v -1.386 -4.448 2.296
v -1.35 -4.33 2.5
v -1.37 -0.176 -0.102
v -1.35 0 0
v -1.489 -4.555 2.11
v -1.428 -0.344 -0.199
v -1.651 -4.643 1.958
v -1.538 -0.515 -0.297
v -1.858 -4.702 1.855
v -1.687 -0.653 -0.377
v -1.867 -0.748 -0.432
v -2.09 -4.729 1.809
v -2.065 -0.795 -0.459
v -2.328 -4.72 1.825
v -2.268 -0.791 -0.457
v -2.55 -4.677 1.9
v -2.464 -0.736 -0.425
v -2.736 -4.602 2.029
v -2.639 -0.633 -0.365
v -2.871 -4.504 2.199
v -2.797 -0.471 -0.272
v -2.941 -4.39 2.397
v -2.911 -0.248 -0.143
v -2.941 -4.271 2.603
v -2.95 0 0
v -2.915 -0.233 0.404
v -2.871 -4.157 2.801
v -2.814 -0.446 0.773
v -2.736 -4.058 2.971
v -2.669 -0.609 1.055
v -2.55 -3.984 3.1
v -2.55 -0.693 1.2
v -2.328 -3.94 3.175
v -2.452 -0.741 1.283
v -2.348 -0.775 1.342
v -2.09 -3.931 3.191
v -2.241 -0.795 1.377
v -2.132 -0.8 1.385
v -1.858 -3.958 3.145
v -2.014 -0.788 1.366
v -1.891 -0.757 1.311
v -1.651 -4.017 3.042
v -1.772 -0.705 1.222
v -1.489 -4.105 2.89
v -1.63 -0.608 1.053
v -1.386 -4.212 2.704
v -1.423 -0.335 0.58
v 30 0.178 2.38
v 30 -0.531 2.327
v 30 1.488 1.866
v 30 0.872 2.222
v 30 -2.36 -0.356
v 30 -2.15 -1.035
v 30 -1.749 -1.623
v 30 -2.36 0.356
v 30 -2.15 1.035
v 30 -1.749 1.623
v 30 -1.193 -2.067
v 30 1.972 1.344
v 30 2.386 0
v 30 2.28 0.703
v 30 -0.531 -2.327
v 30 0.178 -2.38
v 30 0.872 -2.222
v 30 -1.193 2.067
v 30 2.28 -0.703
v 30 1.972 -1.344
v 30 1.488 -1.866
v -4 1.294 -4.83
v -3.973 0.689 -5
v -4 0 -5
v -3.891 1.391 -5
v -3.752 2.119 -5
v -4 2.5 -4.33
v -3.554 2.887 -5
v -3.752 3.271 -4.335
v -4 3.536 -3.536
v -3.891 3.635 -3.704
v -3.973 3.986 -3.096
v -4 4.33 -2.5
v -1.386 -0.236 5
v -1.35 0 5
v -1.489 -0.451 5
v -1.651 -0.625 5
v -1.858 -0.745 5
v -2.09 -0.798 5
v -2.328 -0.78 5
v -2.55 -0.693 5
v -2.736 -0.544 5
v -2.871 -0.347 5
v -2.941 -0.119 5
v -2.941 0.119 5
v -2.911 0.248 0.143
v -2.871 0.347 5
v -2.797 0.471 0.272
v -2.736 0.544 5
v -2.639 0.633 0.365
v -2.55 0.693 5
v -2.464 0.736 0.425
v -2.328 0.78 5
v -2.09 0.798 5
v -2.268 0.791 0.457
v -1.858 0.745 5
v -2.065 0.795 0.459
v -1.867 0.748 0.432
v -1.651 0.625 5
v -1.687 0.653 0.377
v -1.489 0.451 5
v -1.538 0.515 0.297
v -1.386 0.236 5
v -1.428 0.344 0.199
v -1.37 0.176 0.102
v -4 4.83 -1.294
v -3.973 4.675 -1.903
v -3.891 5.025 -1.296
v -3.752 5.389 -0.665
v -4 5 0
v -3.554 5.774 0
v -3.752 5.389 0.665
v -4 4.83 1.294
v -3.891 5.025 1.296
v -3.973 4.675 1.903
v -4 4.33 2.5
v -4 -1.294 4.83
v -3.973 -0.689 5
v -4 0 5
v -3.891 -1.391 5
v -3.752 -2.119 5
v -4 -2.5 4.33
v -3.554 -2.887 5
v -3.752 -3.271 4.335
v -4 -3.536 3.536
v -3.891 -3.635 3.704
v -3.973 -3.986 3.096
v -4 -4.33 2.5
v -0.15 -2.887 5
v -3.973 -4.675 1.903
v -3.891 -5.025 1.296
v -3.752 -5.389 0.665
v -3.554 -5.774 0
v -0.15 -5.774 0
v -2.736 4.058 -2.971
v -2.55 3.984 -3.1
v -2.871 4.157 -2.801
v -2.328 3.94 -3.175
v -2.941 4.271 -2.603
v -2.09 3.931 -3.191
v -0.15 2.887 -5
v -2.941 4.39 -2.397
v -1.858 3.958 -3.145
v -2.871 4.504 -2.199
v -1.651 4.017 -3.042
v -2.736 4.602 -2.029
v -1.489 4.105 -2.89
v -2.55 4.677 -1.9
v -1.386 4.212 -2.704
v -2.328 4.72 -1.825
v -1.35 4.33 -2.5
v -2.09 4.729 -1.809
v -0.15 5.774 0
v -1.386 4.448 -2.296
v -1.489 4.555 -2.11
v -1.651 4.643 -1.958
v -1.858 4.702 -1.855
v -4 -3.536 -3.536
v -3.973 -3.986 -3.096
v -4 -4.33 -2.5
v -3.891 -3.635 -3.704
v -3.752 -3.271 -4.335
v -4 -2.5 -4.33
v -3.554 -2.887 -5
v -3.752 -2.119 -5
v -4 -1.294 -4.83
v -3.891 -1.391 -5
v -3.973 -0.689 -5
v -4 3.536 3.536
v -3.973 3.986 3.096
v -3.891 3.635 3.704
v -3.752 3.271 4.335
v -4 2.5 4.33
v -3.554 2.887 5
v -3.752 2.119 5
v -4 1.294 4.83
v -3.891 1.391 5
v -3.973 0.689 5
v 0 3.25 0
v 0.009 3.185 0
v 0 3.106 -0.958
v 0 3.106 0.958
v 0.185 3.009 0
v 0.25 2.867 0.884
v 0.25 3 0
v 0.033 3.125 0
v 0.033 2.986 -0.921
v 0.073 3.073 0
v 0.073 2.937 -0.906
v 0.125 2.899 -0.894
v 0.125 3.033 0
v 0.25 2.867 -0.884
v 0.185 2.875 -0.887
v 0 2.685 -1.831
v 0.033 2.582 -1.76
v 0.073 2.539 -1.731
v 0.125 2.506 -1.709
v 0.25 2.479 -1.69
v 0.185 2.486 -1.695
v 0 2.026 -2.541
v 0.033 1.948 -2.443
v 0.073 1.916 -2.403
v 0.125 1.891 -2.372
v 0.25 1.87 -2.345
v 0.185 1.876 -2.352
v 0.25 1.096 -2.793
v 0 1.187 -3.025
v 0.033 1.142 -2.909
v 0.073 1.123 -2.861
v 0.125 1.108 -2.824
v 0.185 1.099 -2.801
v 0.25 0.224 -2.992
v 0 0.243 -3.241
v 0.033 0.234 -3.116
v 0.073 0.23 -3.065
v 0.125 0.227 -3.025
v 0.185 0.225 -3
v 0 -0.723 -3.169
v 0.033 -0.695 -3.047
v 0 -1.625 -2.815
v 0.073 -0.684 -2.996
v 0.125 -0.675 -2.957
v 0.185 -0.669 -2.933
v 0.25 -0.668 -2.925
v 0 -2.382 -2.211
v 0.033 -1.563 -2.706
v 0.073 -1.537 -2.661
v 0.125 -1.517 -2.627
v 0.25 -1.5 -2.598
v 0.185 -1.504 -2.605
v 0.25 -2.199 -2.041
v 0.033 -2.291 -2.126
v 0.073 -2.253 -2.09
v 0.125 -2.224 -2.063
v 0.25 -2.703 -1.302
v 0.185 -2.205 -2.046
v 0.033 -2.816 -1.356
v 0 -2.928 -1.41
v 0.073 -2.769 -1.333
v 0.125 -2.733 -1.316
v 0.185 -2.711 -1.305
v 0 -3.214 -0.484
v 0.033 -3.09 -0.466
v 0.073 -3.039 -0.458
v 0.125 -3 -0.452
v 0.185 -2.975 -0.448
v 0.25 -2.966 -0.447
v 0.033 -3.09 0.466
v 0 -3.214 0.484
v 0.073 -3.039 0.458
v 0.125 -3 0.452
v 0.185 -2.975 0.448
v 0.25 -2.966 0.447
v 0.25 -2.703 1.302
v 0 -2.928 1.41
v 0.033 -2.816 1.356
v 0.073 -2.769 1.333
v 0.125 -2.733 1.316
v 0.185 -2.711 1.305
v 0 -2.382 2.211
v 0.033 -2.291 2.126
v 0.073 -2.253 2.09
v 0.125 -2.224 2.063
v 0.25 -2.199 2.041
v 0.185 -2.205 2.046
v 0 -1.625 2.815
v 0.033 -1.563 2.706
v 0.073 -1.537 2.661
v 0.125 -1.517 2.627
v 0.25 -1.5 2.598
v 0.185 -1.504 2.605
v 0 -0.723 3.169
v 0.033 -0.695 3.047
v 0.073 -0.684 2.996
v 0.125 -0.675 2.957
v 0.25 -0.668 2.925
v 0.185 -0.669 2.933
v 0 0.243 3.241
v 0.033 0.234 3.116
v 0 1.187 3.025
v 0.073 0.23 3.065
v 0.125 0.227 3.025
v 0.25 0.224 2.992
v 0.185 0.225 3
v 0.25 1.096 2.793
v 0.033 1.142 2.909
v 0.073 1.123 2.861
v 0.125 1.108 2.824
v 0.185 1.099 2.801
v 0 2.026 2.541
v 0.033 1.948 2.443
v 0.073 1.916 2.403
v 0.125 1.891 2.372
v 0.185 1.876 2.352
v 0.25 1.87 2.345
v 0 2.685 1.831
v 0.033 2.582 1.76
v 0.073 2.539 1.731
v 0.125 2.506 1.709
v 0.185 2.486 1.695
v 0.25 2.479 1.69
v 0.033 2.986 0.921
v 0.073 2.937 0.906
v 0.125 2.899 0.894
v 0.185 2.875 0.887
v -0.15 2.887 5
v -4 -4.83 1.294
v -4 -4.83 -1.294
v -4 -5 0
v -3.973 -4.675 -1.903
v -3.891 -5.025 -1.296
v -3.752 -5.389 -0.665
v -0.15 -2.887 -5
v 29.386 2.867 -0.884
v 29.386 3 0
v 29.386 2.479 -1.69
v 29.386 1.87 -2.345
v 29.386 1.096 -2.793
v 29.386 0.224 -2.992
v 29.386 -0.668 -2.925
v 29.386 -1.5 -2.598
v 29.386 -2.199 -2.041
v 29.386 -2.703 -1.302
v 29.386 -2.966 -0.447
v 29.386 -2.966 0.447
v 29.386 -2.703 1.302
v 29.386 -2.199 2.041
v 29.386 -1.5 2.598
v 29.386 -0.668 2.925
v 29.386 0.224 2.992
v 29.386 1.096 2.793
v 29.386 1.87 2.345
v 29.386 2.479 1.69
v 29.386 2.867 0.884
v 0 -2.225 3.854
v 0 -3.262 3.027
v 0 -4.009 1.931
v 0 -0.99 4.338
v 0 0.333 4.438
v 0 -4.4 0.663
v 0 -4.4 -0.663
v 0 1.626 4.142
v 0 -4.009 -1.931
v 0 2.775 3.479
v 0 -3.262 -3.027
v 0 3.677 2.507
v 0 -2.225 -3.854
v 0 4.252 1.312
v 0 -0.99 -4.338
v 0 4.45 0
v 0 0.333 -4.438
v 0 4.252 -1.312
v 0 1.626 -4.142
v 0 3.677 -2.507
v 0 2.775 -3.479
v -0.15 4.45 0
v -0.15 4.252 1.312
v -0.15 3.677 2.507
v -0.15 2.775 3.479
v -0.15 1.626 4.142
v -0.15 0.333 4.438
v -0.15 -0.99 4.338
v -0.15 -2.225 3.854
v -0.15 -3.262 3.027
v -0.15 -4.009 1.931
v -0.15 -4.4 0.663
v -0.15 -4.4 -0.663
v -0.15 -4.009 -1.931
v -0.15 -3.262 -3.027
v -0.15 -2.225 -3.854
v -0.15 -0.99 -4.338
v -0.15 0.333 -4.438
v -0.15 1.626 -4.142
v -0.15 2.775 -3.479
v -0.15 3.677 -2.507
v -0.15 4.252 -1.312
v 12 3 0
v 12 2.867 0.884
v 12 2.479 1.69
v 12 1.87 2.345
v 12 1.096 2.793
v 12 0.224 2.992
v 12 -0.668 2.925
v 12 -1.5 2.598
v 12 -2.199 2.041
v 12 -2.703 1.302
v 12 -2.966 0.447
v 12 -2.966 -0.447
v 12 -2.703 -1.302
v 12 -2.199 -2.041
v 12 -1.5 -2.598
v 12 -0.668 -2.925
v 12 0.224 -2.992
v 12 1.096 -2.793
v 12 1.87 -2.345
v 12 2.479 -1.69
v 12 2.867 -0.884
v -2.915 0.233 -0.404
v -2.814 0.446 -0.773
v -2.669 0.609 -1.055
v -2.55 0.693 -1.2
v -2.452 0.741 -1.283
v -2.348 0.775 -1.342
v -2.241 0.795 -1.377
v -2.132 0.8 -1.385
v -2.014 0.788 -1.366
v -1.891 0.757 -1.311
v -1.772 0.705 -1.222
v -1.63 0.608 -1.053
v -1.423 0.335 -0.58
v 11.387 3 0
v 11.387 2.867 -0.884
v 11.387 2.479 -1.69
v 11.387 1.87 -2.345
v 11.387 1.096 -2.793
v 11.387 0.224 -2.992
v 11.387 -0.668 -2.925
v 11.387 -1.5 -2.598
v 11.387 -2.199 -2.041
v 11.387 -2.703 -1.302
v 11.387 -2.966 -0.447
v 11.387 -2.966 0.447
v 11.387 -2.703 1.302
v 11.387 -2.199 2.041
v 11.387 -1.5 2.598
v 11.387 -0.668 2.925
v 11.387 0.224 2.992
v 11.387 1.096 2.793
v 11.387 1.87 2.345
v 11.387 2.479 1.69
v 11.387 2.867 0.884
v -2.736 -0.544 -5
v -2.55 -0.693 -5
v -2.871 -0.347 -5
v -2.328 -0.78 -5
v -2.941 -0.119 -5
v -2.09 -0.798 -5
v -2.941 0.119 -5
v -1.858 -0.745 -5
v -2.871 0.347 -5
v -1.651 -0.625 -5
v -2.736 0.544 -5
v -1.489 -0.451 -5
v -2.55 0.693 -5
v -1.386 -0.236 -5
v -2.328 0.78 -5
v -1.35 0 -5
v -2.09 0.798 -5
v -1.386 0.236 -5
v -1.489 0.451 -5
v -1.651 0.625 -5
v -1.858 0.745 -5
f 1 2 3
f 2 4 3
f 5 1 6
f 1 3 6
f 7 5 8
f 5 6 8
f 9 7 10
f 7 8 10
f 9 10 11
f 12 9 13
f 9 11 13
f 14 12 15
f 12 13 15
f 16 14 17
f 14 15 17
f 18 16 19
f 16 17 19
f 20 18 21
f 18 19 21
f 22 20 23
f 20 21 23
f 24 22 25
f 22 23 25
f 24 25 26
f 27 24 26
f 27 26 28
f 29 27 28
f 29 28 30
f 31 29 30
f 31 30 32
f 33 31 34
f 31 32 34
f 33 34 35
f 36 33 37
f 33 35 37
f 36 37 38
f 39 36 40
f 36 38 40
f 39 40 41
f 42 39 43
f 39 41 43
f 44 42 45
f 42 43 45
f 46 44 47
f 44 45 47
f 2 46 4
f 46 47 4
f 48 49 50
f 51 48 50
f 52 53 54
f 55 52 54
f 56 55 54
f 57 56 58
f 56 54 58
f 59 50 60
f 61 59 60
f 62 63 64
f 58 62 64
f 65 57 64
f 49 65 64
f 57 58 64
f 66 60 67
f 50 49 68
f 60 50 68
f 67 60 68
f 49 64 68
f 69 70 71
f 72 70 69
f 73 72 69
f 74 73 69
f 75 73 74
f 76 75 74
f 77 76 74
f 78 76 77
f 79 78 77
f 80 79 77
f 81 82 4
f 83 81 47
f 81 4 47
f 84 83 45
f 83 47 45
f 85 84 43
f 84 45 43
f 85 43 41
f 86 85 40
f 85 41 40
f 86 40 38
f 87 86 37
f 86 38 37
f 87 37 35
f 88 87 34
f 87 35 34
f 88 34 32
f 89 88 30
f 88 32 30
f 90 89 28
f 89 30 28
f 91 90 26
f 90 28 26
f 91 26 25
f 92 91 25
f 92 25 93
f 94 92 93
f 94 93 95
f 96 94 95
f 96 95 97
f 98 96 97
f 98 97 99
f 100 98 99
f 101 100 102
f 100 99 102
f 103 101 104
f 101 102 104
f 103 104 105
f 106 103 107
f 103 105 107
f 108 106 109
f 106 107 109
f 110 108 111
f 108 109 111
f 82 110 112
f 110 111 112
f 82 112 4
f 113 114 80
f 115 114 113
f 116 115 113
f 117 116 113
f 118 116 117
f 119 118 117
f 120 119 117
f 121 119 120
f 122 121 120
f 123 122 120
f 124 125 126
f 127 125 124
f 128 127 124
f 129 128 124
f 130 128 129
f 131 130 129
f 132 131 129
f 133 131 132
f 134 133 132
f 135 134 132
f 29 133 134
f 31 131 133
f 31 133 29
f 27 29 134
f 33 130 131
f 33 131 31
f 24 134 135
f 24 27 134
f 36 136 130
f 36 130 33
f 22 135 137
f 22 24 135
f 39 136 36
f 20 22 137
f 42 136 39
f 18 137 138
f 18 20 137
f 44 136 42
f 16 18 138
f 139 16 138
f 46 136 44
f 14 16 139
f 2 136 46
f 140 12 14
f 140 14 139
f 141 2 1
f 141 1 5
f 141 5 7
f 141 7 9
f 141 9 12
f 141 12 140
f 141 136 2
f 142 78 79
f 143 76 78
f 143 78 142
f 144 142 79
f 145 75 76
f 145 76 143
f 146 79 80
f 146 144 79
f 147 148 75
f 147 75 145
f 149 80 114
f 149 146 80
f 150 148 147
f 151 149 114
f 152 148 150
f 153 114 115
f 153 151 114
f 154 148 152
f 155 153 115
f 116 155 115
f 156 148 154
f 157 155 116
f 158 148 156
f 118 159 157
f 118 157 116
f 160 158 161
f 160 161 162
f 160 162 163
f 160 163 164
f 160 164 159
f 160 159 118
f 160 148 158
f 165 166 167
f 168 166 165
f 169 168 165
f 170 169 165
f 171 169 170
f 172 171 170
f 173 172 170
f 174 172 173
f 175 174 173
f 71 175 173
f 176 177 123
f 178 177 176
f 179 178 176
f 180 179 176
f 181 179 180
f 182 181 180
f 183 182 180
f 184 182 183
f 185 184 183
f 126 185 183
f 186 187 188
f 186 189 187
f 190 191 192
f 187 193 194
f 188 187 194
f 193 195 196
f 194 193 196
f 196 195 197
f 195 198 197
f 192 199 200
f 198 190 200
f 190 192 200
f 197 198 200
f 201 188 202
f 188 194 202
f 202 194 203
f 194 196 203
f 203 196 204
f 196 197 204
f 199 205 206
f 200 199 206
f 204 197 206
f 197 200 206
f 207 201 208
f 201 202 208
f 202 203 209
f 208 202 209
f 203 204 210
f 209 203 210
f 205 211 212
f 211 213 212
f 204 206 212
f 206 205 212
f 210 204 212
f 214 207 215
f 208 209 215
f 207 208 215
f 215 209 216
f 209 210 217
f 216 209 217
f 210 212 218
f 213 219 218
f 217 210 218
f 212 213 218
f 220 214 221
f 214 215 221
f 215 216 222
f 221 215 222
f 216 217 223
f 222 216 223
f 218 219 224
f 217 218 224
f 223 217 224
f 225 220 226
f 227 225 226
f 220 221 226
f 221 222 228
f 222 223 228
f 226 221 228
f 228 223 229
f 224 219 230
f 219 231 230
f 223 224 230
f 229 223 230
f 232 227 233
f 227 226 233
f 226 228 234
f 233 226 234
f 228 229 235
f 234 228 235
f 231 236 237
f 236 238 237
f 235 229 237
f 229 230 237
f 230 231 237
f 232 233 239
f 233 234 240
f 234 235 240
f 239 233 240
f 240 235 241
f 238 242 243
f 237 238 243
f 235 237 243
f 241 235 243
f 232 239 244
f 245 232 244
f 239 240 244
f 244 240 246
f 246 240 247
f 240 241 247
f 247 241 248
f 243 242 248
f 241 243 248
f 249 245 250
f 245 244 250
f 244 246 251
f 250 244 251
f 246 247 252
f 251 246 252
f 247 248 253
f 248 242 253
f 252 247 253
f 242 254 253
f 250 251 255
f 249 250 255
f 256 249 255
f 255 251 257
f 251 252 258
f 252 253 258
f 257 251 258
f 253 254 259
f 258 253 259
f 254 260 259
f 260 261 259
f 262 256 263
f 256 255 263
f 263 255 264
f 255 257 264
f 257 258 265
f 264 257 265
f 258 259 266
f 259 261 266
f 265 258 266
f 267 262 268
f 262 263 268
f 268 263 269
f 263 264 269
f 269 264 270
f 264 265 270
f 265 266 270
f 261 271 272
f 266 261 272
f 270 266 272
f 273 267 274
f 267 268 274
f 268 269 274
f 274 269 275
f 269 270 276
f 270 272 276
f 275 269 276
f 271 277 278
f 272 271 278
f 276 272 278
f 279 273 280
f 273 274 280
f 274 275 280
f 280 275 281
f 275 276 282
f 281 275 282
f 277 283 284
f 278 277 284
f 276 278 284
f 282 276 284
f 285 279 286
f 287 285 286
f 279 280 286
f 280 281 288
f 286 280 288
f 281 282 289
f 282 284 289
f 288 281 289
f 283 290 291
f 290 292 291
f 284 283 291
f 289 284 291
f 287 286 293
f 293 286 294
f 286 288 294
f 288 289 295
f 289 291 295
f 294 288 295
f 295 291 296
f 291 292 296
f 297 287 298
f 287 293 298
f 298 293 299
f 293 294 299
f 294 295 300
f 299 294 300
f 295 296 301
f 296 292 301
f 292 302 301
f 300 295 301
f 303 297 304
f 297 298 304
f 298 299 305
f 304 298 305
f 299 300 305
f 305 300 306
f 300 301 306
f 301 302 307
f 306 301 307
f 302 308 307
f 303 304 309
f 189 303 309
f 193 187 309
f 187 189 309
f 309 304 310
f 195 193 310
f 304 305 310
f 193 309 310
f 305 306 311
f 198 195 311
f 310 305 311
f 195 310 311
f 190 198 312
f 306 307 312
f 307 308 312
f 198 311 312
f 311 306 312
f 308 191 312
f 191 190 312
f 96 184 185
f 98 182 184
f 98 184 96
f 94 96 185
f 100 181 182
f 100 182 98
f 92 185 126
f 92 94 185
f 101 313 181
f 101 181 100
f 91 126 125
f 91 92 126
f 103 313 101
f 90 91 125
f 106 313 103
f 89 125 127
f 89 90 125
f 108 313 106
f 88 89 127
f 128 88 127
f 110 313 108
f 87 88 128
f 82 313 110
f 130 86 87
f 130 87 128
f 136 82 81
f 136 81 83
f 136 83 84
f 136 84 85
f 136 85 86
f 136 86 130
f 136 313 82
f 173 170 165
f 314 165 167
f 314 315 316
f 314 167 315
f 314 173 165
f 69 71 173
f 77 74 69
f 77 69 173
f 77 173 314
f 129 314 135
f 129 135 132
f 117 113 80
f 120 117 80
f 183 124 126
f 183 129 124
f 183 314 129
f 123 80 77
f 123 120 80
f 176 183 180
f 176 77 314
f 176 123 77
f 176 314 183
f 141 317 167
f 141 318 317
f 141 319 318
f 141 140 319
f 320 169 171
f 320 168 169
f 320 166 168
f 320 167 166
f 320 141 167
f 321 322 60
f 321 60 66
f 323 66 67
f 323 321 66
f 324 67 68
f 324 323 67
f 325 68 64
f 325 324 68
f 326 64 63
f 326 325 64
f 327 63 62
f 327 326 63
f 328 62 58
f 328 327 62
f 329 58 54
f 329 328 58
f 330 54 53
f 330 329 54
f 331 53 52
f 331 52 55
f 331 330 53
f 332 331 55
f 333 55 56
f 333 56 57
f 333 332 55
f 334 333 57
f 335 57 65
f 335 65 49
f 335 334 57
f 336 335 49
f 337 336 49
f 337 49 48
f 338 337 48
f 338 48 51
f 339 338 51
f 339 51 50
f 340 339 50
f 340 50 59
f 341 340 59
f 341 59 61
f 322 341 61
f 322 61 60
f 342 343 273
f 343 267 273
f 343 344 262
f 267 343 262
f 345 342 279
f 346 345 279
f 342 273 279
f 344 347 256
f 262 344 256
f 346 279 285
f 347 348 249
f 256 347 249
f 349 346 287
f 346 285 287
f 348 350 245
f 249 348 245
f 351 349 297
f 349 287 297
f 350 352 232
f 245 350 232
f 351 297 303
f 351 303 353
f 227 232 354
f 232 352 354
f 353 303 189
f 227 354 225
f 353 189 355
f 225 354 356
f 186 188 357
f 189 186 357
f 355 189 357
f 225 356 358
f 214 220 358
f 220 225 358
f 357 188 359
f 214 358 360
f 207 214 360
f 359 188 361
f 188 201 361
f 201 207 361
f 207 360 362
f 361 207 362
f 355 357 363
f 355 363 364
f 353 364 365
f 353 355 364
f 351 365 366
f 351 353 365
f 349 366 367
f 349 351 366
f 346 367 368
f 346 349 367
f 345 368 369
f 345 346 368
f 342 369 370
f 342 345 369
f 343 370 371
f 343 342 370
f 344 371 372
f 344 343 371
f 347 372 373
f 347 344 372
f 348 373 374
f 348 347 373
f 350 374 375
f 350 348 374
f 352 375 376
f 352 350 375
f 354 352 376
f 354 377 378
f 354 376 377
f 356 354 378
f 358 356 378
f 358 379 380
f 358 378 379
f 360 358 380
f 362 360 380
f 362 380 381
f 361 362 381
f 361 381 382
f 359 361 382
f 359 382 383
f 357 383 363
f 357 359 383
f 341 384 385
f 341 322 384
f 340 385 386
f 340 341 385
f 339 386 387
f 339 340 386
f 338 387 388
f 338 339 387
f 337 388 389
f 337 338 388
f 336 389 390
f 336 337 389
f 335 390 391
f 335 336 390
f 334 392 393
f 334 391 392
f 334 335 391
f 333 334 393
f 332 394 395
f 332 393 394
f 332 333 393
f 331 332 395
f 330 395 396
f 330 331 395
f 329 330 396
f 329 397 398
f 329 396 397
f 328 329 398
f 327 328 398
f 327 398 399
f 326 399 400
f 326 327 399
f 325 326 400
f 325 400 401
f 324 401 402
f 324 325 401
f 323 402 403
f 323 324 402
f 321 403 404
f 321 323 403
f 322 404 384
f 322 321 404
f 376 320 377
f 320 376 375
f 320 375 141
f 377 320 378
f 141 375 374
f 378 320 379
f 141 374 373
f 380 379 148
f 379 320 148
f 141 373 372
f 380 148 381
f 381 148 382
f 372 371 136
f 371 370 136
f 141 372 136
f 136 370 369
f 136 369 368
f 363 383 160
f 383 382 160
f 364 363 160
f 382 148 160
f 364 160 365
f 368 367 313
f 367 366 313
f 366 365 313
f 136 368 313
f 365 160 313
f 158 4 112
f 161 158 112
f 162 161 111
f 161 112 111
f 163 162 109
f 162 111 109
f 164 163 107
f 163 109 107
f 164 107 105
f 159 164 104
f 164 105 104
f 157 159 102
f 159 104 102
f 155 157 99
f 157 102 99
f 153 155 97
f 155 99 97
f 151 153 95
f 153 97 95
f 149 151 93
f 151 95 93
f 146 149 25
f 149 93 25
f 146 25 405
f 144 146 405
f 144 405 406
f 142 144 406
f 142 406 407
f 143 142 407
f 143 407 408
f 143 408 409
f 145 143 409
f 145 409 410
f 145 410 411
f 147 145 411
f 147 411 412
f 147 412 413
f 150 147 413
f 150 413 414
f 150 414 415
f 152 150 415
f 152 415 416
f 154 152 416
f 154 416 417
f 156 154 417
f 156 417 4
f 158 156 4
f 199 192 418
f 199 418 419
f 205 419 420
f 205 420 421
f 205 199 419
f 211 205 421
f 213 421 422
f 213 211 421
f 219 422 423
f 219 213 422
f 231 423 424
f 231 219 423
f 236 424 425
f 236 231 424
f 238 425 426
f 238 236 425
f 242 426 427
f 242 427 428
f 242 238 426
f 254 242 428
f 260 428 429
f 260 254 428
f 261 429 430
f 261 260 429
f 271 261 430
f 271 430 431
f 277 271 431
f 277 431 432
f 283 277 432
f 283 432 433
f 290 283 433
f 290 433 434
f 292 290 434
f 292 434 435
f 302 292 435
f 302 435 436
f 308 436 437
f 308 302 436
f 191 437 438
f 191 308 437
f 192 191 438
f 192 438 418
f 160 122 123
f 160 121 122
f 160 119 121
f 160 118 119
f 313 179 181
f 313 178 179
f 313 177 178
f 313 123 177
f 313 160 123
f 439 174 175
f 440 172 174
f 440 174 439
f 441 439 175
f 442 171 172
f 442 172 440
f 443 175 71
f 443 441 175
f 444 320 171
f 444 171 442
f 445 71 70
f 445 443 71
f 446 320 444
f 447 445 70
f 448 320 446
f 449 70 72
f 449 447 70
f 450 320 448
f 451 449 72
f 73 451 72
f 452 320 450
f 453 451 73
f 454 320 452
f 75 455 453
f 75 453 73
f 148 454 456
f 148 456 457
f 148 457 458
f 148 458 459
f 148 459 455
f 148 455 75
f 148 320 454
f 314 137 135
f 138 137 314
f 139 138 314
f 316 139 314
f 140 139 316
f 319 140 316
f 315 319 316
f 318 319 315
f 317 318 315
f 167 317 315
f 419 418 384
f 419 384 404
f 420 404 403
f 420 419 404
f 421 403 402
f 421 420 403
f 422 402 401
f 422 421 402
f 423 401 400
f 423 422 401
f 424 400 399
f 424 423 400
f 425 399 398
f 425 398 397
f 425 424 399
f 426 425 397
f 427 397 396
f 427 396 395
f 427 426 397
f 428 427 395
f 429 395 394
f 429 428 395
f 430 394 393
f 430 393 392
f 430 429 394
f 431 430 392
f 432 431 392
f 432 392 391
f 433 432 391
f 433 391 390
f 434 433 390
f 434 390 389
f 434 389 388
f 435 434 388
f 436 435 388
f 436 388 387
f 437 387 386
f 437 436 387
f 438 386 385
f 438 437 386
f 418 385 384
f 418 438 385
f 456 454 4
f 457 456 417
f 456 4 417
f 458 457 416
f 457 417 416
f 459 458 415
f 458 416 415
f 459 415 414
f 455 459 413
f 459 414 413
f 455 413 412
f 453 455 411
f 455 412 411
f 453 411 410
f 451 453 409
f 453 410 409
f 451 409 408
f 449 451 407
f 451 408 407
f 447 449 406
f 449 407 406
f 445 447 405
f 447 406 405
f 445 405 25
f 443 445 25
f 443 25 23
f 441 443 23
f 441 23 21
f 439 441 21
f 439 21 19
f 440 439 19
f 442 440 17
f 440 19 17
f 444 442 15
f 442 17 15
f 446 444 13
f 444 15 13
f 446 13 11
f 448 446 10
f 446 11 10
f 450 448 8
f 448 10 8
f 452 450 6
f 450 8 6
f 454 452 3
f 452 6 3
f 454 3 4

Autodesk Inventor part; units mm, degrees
ref_plane "YZ Plane" through (0, 0, 0) normal (1, 0, 0) x (0, 1, 0)
ref_plane "XZ Plane" through (0, 0, 0) normal (0, 1, 0) x (-1, 0, 0)
sketch "草图1" plane through (0, 0, 0) normal (0, 0, 1) x (1, 0, 0)
  line L0 (0, 4.45) -> (0, 3)
  line L1 (12, 3) -> (30, 3)
  line L2 (30, 3) -> (30, 0)
  line L3 (30, 0) -> (-0.1501, 0)
  line L4 (-6.1801, 0) -> (36.03, 0) projected
  line L5 (-0.1501, 0) -> (-0.1501, 4.45)
  line L6 (-0.1501, 4.45) -> (0, 4.45)
  line L7 (12, 3) -> (11.3866, 3)
  line L8 (11.3866, 3) -> (0, 3)
  line L9 (0, -0.89) -> (0, 5.34) projected
  line L10 (11.3866, 3) -> (11.3866, 0) construction
  line L11 (12, 3) -> (12, 0) construction
  dimension "d0" = 30
  dimension "d1" = 18
  dimension "d2" = 6
  dimension "d9" = 0.1501
  dimension "d10" = 8.9
  dimension "d13" = 0.6135
  dimension "d14" = 6
revolve "轴承体" add sketch "草图1" angle 360 about axis through (30, 0, 0) along (-1, 0, 0)
sketch "草图2" plane through (-0.1501, 0, 0) normal (-1, 0, 0) x (0, 0, 1)
  line L0 (0, 5.7735) -> (5, 2.8868)
  line L1 (5, 2.8868) -> (5, -2.8868)
  line L2 (5, -2.8868) -> (0, -5.7735)
  line L3 (0, -5.7735) -> (-5, -2.8868)
  line L4 (-5, -2.8868) -> (-5, 2.8868)
  line L5 (-5, 2.8868) -> (0, 5.7735)
  point P0 (0, 0)
  point P1 (0, 0)
  dimension "d11" = 10
extrude "头" add sketch "草图2" along normal blind 3.85
sketch "草图3" plane through (0, 0, 0) normal (0, 0, 1) x (1, 0, 0)
  line L0 (-4.0001, 5) -> (-4.0001, 5.7735)
  line L1 (-4.0001, 5.7735) -> (-3.5535, 5.7735)
  line L2 (-3.5535, 5.7735) -> (-4.0001, 5)
  line L3 (-4.7701, 0) -> (0.6199, 0) projected
  line L4 (-0.1501, 5.7735) -> (-4.0001, 5.7735) projected
  line L5 (-4.0001, 2.8868) -> (-4.0001, 5.7735) projected
  dimension "d5" = 30
  dimension "d25" = 10
revolve "倒角1" cut sketch "草图3" angle 360 about axis through (-10, 0, 0) along (1, 0, 0)
sketch "草图4" plane through (0, 0, 0) normal (0, 0, 1) x (1, 0, 0)
  circle A0 centre (-2.15, 0) radius 0.8
  line L0 (-3.54, 0) -> (0.59, 0) projected
  point P0 (0, 0)
  dimension "d18" = 1.6
  dimension "d19" = 2.15
extrude "孔" cut sketch "草图4" along normal through all both and the other way through all
pattern_circular "IDS_ARRAYHOLE" count 2 over 60 about axis through (-10, 0, 0) along (1, 0, 0) of "孔"
fillet "圆角1" radius 0.25 1 edges at (0, -3, 0)
thread "螺纹" size "M6x1" designation "M6" class "6g" standard "GB Metric profile" length 18
chamfer "倒角2" distance 0.6135 distance2 0.6136 1 edges at (30, -3, 0) measured on face at (30, -0.5525, 1.8157)
ref_plane "Work Plane1" through (16, 0, 0) normal (0, 0, -1) x (1, 0, 0)
equation "\"d0\" = NLG"
equation "\"d1\" = GEL"
equation "\"d2\" = GD"
equation "\"d10\" = SD2"
equation "\"d13\" = GAL"
equation "\"d14\" = BDM"
equation "\"d11\" = SW"
equation "\"d3\" = KOH - SD"
equation "\"d5\" = ANG1"
equation "\"d25\" = SW0"
equation "\"d18\" = BOR"
equation "\"d19\" = DIST + SD"
equation "\"d24\" = RR"
equation "\"d15\" = GEL"
equation "\"d6\" = -0.5 * SPD + 0.5 * GD"
equation "\"NLG\" = 30"
equation "\"GD\" = NND"
equation "\"BDM\" = NND"
equation "\"KOH\" = 4"
equation "\"GEL\" = 18"
equation "\"SW\" = 10"
equation "\"SW0\" = SW"
equation "\"SPD\" = NND - 1.2269 * PTC"
equation "\"SD2\" = SDH"
equation "\"SD\" = WFT"
equation "\"ANG1\" = 30deg"
equation "\"GAL\" = 0.61345 * PTC"
equation "\"GUL\" = 0.61345 * PTC"
equation "\"DIST\" = 2"
equation "\"BOR\" = 1.6"
equation "\"RR\" = 0.25"
equation "\"WFT\" = 0.15"
equation "\"FAWI\" = 45deg"
equation "\"PTC\" = 1"
equation "\"THREADDIA\" = 6"
equation "\"E0\" = 1.155 * SW"
equation "\"TOA\" = 30deg"
equation "\"NND\" = 6"
equation "\"GD1\" = THREADDIA - 1.2269 * PTC"
equation "\"SDH\" = 8.9"
properties part number "螺栓 GB 32.1 M6 x 30" material "钢，软"
